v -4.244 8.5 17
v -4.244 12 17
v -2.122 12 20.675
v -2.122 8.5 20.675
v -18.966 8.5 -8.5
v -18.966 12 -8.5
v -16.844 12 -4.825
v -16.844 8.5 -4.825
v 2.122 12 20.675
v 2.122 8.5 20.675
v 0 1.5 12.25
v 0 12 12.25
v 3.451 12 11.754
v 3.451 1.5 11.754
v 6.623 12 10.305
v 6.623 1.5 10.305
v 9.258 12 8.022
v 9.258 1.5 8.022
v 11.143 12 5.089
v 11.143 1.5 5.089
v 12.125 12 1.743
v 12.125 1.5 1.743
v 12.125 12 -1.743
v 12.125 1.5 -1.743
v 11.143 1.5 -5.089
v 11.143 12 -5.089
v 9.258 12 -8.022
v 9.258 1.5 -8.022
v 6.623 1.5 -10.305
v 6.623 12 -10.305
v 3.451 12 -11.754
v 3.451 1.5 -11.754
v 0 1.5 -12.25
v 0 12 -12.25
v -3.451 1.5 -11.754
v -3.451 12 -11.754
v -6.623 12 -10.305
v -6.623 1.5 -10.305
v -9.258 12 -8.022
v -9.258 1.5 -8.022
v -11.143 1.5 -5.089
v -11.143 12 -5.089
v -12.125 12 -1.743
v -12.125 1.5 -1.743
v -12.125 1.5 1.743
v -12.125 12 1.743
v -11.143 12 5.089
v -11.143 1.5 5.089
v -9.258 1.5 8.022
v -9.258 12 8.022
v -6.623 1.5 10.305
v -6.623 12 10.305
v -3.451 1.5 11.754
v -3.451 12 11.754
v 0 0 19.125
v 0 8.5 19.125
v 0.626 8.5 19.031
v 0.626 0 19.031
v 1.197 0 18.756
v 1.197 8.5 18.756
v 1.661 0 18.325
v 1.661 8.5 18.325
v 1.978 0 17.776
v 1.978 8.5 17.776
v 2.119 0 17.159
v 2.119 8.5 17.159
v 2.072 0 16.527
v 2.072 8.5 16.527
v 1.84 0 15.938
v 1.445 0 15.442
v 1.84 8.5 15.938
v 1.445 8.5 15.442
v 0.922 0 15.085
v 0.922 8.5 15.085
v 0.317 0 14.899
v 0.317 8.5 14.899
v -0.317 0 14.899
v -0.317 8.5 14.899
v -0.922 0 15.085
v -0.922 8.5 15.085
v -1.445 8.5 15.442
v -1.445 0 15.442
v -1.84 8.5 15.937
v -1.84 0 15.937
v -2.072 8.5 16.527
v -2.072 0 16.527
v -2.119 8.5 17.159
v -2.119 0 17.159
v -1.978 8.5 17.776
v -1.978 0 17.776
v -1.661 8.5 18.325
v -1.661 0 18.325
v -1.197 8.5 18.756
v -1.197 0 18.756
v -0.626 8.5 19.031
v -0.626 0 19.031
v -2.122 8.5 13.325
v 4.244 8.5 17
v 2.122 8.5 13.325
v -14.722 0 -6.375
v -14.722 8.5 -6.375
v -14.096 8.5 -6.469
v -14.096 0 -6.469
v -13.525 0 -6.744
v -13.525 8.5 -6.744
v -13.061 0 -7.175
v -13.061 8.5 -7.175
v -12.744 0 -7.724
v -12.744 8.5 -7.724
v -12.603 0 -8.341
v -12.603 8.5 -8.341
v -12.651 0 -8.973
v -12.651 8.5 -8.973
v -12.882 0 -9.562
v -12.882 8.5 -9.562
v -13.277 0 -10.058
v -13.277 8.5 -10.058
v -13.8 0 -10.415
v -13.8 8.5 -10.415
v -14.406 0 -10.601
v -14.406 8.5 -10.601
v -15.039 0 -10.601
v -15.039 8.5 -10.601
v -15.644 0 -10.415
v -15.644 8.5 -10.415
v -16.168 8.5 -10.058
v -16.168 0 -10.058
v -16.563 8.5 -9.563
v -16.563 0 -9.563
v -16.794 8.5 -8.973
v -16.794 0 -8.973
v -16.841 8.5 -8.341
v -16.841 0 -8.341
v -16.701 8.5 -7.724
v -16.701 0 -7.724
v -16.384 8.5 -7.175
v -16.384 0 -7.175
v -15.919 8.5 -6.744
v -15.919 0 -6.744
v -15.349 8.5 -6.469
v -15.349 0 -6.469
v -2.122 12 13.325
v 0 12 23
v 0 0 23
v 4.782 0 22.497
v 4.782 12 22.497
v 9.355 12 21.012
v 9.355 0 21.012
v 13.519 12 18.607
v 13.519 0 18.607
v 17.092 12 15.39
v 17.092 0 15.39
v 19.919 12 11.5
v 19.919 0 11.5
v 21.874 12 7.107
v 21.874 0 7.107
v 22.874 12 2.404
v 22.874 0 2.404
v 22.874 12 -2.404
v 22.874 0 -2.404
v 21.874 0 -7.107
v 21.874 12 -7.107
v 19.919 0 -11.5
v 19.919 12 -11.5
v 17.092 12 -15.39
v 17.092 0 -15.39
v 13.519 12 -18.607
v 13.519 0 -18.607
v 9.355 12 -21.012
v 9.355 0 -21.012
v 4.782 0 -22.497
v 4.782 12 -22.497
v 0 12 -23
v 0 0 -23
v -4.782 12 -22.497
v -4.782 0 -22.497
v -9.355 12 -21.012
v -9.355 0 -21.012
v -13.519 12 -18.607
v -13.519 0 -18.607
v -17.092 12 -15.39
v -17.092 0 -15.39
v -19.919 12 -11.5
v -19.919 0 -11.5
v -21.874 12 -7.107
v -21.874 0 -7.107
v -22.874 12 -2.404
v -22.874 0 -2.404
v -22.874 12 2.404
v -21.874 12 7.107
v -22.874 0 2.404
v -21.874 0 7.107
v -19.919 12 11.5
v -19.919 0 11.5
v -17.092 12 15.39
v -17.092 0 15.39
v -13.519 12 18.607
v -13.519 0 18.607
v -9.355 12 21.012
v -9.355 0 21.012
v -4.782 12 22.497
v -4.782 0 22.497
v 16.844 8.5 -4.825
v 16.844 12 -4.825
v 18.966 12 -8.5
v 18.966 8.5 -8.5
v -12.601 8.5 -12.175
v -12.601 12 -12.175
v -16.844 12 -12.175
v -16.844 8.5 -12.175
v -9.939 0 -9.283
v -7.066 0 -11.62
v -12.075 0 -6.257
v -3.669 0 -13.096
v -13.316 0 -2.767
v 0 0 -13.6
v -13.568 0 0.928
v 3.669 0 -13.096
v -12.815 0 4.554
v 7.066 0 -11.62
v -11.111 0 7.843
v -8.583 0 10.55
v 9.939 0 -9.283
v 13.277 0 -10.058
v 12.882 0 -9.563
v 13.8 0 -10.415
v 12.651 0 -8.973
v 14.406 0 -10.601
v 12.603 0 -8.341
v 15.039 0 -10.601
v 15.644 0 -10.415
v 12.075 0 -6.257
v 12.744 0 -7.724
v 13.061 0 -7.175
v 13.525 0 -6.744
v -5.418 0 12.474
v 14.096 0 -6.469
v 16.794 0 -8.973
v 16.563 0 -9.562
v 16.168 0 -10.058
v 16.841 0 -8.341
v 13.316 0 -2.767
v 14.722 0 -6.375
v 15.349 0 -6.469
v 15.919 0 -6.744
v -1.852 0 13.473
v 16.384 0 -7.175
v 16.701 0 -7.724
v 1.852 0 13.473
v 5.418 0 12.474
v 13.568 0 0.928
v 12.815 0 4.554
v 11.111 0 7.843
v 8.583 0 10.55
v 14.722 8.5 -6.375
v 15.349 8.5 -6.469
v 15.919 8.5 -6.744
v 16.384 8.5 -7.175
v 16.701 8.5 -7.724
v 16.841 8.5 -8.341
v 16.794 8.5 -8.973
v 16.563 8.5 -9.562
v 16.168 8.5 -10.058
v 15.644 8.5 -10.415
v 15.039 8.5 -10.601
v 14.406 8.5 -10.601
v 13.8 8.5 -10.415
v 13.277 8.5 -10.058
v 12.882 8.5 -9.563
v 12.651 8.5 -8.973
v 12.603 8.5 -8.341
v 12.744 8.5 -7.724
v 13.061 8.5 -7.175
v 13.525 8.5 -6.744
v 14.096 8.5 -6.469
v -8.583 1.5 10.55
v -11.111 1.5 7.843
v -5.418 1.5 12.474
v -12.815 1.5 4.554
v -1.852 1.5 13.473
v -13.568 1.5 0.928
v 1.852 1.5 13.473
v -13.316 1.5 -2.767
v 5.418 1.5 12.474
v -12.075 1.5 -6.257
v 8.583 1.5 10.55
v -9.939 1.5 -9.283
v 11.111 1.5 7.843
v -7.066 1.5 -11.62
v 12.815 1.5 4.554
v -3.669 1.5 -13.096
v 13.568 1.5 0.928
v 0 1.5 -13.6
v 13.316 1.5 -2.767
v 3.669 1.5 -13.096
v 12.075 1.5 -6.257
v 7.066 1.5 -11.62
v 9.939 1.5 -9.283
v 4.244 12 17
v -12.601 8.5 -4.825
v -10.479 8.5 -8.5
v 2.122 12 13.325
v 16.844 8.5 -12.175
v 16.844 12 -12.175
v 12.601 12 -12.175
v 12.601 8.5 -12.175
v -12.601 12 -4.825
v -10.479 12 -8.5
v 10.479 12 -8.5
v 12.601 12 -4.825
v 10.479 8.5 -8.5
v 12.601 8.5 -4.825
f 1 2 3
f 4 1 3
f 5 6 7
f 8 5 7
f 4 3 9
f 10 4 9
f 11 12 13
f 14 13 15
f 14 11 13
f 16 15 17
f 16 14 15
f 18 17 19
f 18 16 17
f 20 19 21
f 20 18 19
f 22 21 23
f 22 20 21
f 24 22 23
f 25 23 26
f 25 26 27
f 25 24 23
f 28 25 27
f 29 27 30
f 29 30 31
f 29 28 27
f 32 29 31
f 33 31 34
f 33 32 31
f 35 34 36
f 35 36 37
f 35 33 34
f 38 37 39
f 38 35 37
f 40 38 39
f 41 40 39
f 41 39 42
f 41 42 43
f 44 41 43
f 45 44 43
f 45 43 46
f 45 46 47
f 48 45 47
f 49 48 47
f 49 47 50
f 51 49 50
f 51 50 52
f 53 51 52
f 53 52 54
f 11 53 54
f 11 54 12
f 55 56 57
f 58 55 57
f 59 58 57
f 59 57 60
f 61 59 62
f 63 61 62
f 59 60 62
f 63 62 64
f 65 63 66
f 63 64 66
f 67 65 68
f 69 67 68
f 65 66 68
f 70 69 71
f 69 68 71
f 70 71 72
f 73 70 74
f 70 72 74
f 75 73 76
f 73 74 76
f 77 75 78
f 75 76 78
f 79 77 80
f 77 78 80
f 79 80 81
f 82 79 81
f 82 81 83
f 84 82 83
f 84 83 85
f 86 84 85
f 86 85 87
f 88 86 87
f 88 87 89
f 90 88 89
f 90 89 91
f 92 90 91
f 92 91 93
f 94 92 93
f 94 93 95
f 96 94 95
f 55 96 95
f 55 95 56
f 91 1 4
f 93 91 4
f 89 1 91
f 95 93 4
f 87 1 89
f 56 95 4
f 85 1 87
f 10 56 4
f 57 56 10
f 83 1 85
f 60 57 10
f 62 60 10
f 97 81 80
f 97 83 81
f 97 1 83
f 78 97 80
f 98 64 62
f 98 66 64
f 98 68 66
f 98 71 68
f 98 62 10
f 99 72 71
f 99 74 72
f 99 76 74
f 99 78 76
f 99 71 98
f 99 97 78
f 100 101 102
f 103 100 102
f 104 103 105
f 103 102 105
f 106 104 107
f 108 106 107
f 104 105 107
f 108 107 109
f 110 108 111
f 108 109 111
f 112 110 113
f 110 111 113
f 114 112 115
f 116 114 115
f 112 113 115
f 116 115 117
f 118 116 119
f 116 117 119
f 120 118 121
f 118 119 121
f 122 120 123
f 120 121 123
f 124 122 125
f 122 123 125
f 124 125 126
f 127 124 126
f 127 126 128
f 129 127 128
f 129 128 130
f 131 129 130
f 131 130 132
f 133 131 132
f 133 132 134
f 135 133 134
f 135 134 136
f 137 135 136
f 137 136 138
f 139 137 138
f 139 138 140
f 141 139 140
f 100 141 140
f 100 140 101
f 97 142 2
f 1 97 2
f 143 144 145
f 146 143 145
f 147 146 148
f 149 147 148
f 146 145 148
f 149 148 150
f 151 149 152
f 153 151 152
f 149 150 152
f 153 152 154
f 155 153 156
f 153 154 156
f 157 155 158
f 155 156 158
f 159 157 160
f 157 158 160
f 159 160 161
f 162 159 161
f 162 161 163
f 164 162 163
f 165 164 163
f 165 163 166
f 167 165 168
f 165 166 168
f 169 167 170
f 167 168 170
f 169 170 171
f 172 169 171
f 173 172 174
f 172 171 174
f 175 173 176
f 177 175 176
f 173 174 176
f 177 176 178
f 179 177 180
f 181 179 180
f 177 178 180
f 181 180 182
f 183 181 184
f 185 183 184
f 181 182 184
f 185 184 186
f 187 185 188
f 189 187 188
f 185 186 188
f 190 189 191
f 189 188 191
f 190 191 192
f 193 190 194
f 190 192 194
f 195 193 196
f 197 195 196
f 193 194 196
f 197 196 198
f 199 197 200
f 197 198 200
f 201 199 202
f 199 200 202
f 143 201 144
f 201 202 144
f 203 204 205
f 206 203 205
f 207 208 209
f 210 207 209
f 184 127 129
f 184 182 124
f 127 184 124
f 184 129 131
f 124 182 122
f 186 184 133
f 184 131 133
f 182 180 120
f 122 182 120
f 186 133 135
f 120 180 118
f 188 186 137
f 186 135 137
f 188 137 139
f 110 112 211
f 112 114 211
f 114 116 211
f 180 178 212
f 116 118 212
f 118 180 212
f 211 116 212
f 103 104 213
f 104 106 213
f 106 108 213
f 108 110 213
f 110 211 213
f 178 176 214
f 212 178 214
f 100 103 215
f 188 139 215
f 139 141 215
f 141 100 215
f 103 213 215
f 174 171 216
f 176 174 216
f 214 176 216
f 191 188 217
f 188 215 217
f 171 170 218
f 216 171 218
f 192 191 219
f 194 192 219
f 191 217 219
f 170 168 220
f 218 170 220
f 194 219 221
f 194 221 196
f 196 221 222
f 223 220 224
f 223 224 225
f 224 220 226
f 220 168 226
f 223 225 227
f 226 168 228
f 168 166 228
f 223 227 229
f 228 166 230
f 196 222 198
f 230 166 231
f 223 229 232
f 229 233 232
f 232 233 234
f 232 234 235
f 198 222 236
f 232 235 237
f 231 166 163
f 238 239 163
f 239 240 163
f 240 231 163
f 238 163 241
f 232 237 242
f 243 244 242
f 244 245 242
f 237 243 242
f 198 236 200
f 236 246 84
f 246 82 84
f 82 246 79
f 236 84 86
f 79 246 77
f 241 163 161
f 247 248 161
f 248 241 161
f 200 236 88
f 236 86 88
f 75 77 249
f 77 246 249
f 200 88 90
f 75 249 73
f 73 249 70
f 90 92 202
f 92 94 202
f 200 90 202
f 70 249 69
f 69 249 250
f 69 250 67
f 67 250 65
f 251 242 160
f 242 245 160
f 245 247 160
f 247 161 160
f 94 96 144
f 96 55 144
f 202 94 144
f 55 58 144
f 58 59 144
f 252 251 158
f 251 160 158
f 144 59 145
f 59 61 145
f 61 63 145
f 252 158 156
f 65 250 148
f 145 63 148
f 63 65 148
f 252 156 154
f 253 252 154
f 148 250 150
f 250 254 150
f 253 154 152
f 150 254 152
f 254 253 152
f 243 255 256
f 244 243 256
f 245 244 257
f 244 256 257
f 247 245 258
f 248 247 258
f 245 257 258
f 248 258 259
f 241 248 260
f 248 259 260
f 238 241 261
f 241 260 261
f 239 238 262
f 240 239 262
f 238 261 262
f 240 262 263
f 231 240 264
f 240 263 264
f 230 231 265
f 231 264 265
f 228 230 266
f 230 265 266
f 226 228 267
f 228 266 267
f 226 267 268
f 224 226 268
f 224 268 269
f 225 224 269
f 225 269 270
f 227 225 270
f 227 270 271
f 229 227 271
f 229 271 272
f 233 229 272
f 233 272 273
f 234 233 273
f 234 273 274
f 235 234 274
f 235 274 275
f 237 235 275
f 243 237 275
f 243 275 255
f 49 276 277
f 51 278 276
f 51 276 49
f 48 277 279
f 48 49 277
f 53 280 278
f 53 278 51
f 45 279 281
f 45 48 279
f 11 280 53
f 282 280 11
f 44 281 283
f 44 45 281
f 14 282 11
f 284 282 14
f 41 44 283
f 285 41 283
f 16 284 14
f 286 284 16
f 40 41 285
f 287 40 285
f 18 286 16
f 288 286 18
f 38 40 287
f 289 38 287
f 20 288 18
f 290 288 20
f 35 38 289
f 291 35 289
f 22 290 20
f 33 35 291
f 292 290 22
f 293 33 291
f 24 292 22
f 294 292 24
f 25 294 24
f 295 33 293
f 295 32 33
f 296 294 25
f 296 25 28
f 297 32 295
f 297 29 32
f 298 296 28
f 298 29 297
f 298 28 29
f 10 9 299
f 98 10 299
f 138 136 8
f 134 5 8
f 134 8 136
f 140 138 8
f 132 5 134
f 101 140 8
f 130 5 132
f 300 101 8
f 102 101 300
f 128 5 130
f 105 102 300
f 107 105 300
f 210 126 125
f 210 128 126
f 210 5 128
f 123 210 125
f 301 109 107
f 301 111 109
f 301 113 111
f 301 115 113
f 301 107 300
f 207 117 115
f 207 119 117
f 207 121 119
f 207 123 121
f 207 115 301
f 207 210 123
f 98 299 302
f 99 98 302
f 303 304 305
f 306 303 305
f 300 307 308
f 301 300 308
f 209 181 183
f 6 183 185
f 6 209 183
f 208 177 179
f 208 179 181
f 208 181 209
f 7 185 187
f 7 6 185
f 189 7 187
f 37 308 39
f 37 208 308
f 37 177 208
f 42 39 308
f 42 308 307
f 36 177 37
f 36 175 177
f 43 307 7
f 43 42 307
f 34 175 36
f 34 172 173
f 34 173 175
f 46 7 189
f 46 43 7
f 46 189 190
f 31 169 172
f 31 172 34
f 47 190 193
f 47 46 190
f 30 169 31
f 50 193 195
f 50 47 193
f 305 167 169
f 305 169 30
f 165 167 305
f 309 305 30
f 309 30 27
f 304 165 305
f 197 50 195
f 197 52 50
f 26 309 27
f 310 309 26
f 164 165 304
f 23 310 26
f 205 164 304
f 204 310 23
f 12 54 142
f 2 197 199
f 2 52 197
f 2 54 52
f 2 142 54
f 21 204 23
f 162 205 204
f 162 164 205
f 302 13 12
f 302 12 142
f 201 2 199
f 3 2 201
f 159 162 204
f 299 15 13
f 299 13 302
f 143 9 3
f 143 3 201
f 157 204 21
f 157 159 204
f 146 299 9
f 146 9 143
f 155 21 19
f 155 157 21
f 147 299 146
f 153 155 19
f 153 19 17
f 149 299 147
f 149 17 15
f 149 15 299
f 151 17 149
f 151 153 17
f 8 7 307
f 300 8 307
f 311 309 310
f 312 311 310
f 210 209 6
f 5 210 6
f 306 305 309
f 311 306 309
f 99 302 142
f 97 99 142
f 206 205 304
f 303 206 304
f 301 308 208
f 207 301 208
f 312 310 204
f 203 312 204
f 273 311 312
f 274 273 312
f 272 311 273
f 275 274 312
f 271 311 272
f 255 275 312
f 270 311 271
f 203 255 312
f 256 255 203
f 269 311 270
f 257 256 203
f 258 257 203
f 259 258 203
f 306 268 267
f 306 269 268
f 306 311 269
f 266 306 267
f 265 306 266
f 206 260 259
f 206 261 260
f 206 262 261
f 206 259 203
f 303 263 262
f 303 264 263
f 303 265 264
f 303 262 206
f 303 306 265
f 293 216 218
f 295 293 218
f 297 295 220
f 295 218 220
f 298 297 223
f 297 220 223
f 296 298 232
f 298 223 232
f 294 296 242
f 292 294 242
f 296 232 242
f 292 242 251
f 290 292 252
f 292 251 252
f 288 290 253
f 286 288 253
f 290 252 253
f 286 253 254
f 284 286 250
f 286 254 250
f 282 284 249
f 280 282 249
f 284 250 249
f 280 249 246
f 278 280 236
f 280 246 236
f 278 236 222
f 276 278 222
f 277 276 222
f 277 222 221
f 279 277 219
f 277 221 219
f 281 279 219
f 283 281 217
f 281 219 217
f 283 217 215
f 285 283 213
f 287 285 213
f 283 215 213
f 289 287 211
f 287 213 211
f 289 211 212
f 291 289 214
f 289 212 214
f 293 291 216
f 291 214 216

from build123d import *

# Parameters (mm, degrees)
SKETCH1_R           = 23
SKETCH1_R_2         = 12.25
BOSS_EXTRUDE1_DEPTH = 12
SKETCH2_R           = 13.6
CUT_EXTRUDE1_DEPTH  = 1.5
SKETCH3_R           = 2.125
CUT_EXTRUDE2_DEPTH  = 35.669871647
CUT_EXTRUDE3_DEPTH  = 3.5


with BuildPart() as part:
    # Sketch1 → Boss-Extrude1 (new body)
    with BuildSketch(Plane(origin=(0, 0, 0), x_dir=(1, 0, 0), z_dir=(0, 1, 0))):
        with Locations(Location((0, 0, 0), (0, 0, 270))):
            Circle(SKETCH1_R)
        with Locations(Location((0, 0, 0), (0, 0, 270))):
            Circle(SKETCH1_R_2, mode=Mode.SUBTRACT)
    extrude(amount=BOSS_EXTRUDE1_DEPTH)

    # Sketch2 → Cut-Extrude1 (cut)
    with BuildSketch(Plane.XZ):
        with Locations(Location((0, 0, 0), (0, 0, 270))):
            Circle(SKETCH2_R)
    extrude(amount=-CUT_EXTRUDE1_DEPTH, mode=Mode.SUBTRACT)

    # Sketch3 → Cut-Extrude2 (cut, through all)
    with BuildSketch(Plane(origin=(0, 12, 0), x_dir=(1, 0, 0), z_dir=(0, 1, 0))):
        with Locations(Location((0, -17, 0), (0, 0, 270))):
            Circle(SKETCH3_R)
        with Locations(Location((-14.722431864, 8.5, 0), (0, 0, 270))):
            Circle(SKETCH3_R)
        with Locations(Location((14.722431864, 8.5, 0), (0, 0, 270))):
            Circle(SKETCH3_R)
    extrude(amount=-CUT_EXTRUDE2_DEPTH, mode=Mode.SUBTRACT)

    # Sketch4 → Cut-Extrude3 (cut)
    with BuildSketch(Plane(origin=(0, 12, 0), x_dir=(1, 0, 0), z_dir=(0, 1, 0))):
        Polygon((-16.844194104, 4.825), (-12.600669625, 4.825), (-10.478907386, 8.5), (-12.600669625, 12.175), (-16.844194104, 12.175), (-18.965956343, 8.5), align=None)
        Polygon((4.243524479, -17), (2.121762239, -13.325), (-2.121762239, -13.325), (-4.243524479, -17), (-2.121762239, -20.675), (2.121762239, -20.675), align=None)
        Polygon((12.600669625, 12.175), (10.478907386, 8.5), (12.600669625, 4.825), (16.844194104, 4.825), (18.965956343, 8.5), (16.844194104, 12.175), align=None)
    extrude(amount=-CUT_EXTRUDE3_DEPTH, mode=Mode.SUBTRACT)


solid = part.part
